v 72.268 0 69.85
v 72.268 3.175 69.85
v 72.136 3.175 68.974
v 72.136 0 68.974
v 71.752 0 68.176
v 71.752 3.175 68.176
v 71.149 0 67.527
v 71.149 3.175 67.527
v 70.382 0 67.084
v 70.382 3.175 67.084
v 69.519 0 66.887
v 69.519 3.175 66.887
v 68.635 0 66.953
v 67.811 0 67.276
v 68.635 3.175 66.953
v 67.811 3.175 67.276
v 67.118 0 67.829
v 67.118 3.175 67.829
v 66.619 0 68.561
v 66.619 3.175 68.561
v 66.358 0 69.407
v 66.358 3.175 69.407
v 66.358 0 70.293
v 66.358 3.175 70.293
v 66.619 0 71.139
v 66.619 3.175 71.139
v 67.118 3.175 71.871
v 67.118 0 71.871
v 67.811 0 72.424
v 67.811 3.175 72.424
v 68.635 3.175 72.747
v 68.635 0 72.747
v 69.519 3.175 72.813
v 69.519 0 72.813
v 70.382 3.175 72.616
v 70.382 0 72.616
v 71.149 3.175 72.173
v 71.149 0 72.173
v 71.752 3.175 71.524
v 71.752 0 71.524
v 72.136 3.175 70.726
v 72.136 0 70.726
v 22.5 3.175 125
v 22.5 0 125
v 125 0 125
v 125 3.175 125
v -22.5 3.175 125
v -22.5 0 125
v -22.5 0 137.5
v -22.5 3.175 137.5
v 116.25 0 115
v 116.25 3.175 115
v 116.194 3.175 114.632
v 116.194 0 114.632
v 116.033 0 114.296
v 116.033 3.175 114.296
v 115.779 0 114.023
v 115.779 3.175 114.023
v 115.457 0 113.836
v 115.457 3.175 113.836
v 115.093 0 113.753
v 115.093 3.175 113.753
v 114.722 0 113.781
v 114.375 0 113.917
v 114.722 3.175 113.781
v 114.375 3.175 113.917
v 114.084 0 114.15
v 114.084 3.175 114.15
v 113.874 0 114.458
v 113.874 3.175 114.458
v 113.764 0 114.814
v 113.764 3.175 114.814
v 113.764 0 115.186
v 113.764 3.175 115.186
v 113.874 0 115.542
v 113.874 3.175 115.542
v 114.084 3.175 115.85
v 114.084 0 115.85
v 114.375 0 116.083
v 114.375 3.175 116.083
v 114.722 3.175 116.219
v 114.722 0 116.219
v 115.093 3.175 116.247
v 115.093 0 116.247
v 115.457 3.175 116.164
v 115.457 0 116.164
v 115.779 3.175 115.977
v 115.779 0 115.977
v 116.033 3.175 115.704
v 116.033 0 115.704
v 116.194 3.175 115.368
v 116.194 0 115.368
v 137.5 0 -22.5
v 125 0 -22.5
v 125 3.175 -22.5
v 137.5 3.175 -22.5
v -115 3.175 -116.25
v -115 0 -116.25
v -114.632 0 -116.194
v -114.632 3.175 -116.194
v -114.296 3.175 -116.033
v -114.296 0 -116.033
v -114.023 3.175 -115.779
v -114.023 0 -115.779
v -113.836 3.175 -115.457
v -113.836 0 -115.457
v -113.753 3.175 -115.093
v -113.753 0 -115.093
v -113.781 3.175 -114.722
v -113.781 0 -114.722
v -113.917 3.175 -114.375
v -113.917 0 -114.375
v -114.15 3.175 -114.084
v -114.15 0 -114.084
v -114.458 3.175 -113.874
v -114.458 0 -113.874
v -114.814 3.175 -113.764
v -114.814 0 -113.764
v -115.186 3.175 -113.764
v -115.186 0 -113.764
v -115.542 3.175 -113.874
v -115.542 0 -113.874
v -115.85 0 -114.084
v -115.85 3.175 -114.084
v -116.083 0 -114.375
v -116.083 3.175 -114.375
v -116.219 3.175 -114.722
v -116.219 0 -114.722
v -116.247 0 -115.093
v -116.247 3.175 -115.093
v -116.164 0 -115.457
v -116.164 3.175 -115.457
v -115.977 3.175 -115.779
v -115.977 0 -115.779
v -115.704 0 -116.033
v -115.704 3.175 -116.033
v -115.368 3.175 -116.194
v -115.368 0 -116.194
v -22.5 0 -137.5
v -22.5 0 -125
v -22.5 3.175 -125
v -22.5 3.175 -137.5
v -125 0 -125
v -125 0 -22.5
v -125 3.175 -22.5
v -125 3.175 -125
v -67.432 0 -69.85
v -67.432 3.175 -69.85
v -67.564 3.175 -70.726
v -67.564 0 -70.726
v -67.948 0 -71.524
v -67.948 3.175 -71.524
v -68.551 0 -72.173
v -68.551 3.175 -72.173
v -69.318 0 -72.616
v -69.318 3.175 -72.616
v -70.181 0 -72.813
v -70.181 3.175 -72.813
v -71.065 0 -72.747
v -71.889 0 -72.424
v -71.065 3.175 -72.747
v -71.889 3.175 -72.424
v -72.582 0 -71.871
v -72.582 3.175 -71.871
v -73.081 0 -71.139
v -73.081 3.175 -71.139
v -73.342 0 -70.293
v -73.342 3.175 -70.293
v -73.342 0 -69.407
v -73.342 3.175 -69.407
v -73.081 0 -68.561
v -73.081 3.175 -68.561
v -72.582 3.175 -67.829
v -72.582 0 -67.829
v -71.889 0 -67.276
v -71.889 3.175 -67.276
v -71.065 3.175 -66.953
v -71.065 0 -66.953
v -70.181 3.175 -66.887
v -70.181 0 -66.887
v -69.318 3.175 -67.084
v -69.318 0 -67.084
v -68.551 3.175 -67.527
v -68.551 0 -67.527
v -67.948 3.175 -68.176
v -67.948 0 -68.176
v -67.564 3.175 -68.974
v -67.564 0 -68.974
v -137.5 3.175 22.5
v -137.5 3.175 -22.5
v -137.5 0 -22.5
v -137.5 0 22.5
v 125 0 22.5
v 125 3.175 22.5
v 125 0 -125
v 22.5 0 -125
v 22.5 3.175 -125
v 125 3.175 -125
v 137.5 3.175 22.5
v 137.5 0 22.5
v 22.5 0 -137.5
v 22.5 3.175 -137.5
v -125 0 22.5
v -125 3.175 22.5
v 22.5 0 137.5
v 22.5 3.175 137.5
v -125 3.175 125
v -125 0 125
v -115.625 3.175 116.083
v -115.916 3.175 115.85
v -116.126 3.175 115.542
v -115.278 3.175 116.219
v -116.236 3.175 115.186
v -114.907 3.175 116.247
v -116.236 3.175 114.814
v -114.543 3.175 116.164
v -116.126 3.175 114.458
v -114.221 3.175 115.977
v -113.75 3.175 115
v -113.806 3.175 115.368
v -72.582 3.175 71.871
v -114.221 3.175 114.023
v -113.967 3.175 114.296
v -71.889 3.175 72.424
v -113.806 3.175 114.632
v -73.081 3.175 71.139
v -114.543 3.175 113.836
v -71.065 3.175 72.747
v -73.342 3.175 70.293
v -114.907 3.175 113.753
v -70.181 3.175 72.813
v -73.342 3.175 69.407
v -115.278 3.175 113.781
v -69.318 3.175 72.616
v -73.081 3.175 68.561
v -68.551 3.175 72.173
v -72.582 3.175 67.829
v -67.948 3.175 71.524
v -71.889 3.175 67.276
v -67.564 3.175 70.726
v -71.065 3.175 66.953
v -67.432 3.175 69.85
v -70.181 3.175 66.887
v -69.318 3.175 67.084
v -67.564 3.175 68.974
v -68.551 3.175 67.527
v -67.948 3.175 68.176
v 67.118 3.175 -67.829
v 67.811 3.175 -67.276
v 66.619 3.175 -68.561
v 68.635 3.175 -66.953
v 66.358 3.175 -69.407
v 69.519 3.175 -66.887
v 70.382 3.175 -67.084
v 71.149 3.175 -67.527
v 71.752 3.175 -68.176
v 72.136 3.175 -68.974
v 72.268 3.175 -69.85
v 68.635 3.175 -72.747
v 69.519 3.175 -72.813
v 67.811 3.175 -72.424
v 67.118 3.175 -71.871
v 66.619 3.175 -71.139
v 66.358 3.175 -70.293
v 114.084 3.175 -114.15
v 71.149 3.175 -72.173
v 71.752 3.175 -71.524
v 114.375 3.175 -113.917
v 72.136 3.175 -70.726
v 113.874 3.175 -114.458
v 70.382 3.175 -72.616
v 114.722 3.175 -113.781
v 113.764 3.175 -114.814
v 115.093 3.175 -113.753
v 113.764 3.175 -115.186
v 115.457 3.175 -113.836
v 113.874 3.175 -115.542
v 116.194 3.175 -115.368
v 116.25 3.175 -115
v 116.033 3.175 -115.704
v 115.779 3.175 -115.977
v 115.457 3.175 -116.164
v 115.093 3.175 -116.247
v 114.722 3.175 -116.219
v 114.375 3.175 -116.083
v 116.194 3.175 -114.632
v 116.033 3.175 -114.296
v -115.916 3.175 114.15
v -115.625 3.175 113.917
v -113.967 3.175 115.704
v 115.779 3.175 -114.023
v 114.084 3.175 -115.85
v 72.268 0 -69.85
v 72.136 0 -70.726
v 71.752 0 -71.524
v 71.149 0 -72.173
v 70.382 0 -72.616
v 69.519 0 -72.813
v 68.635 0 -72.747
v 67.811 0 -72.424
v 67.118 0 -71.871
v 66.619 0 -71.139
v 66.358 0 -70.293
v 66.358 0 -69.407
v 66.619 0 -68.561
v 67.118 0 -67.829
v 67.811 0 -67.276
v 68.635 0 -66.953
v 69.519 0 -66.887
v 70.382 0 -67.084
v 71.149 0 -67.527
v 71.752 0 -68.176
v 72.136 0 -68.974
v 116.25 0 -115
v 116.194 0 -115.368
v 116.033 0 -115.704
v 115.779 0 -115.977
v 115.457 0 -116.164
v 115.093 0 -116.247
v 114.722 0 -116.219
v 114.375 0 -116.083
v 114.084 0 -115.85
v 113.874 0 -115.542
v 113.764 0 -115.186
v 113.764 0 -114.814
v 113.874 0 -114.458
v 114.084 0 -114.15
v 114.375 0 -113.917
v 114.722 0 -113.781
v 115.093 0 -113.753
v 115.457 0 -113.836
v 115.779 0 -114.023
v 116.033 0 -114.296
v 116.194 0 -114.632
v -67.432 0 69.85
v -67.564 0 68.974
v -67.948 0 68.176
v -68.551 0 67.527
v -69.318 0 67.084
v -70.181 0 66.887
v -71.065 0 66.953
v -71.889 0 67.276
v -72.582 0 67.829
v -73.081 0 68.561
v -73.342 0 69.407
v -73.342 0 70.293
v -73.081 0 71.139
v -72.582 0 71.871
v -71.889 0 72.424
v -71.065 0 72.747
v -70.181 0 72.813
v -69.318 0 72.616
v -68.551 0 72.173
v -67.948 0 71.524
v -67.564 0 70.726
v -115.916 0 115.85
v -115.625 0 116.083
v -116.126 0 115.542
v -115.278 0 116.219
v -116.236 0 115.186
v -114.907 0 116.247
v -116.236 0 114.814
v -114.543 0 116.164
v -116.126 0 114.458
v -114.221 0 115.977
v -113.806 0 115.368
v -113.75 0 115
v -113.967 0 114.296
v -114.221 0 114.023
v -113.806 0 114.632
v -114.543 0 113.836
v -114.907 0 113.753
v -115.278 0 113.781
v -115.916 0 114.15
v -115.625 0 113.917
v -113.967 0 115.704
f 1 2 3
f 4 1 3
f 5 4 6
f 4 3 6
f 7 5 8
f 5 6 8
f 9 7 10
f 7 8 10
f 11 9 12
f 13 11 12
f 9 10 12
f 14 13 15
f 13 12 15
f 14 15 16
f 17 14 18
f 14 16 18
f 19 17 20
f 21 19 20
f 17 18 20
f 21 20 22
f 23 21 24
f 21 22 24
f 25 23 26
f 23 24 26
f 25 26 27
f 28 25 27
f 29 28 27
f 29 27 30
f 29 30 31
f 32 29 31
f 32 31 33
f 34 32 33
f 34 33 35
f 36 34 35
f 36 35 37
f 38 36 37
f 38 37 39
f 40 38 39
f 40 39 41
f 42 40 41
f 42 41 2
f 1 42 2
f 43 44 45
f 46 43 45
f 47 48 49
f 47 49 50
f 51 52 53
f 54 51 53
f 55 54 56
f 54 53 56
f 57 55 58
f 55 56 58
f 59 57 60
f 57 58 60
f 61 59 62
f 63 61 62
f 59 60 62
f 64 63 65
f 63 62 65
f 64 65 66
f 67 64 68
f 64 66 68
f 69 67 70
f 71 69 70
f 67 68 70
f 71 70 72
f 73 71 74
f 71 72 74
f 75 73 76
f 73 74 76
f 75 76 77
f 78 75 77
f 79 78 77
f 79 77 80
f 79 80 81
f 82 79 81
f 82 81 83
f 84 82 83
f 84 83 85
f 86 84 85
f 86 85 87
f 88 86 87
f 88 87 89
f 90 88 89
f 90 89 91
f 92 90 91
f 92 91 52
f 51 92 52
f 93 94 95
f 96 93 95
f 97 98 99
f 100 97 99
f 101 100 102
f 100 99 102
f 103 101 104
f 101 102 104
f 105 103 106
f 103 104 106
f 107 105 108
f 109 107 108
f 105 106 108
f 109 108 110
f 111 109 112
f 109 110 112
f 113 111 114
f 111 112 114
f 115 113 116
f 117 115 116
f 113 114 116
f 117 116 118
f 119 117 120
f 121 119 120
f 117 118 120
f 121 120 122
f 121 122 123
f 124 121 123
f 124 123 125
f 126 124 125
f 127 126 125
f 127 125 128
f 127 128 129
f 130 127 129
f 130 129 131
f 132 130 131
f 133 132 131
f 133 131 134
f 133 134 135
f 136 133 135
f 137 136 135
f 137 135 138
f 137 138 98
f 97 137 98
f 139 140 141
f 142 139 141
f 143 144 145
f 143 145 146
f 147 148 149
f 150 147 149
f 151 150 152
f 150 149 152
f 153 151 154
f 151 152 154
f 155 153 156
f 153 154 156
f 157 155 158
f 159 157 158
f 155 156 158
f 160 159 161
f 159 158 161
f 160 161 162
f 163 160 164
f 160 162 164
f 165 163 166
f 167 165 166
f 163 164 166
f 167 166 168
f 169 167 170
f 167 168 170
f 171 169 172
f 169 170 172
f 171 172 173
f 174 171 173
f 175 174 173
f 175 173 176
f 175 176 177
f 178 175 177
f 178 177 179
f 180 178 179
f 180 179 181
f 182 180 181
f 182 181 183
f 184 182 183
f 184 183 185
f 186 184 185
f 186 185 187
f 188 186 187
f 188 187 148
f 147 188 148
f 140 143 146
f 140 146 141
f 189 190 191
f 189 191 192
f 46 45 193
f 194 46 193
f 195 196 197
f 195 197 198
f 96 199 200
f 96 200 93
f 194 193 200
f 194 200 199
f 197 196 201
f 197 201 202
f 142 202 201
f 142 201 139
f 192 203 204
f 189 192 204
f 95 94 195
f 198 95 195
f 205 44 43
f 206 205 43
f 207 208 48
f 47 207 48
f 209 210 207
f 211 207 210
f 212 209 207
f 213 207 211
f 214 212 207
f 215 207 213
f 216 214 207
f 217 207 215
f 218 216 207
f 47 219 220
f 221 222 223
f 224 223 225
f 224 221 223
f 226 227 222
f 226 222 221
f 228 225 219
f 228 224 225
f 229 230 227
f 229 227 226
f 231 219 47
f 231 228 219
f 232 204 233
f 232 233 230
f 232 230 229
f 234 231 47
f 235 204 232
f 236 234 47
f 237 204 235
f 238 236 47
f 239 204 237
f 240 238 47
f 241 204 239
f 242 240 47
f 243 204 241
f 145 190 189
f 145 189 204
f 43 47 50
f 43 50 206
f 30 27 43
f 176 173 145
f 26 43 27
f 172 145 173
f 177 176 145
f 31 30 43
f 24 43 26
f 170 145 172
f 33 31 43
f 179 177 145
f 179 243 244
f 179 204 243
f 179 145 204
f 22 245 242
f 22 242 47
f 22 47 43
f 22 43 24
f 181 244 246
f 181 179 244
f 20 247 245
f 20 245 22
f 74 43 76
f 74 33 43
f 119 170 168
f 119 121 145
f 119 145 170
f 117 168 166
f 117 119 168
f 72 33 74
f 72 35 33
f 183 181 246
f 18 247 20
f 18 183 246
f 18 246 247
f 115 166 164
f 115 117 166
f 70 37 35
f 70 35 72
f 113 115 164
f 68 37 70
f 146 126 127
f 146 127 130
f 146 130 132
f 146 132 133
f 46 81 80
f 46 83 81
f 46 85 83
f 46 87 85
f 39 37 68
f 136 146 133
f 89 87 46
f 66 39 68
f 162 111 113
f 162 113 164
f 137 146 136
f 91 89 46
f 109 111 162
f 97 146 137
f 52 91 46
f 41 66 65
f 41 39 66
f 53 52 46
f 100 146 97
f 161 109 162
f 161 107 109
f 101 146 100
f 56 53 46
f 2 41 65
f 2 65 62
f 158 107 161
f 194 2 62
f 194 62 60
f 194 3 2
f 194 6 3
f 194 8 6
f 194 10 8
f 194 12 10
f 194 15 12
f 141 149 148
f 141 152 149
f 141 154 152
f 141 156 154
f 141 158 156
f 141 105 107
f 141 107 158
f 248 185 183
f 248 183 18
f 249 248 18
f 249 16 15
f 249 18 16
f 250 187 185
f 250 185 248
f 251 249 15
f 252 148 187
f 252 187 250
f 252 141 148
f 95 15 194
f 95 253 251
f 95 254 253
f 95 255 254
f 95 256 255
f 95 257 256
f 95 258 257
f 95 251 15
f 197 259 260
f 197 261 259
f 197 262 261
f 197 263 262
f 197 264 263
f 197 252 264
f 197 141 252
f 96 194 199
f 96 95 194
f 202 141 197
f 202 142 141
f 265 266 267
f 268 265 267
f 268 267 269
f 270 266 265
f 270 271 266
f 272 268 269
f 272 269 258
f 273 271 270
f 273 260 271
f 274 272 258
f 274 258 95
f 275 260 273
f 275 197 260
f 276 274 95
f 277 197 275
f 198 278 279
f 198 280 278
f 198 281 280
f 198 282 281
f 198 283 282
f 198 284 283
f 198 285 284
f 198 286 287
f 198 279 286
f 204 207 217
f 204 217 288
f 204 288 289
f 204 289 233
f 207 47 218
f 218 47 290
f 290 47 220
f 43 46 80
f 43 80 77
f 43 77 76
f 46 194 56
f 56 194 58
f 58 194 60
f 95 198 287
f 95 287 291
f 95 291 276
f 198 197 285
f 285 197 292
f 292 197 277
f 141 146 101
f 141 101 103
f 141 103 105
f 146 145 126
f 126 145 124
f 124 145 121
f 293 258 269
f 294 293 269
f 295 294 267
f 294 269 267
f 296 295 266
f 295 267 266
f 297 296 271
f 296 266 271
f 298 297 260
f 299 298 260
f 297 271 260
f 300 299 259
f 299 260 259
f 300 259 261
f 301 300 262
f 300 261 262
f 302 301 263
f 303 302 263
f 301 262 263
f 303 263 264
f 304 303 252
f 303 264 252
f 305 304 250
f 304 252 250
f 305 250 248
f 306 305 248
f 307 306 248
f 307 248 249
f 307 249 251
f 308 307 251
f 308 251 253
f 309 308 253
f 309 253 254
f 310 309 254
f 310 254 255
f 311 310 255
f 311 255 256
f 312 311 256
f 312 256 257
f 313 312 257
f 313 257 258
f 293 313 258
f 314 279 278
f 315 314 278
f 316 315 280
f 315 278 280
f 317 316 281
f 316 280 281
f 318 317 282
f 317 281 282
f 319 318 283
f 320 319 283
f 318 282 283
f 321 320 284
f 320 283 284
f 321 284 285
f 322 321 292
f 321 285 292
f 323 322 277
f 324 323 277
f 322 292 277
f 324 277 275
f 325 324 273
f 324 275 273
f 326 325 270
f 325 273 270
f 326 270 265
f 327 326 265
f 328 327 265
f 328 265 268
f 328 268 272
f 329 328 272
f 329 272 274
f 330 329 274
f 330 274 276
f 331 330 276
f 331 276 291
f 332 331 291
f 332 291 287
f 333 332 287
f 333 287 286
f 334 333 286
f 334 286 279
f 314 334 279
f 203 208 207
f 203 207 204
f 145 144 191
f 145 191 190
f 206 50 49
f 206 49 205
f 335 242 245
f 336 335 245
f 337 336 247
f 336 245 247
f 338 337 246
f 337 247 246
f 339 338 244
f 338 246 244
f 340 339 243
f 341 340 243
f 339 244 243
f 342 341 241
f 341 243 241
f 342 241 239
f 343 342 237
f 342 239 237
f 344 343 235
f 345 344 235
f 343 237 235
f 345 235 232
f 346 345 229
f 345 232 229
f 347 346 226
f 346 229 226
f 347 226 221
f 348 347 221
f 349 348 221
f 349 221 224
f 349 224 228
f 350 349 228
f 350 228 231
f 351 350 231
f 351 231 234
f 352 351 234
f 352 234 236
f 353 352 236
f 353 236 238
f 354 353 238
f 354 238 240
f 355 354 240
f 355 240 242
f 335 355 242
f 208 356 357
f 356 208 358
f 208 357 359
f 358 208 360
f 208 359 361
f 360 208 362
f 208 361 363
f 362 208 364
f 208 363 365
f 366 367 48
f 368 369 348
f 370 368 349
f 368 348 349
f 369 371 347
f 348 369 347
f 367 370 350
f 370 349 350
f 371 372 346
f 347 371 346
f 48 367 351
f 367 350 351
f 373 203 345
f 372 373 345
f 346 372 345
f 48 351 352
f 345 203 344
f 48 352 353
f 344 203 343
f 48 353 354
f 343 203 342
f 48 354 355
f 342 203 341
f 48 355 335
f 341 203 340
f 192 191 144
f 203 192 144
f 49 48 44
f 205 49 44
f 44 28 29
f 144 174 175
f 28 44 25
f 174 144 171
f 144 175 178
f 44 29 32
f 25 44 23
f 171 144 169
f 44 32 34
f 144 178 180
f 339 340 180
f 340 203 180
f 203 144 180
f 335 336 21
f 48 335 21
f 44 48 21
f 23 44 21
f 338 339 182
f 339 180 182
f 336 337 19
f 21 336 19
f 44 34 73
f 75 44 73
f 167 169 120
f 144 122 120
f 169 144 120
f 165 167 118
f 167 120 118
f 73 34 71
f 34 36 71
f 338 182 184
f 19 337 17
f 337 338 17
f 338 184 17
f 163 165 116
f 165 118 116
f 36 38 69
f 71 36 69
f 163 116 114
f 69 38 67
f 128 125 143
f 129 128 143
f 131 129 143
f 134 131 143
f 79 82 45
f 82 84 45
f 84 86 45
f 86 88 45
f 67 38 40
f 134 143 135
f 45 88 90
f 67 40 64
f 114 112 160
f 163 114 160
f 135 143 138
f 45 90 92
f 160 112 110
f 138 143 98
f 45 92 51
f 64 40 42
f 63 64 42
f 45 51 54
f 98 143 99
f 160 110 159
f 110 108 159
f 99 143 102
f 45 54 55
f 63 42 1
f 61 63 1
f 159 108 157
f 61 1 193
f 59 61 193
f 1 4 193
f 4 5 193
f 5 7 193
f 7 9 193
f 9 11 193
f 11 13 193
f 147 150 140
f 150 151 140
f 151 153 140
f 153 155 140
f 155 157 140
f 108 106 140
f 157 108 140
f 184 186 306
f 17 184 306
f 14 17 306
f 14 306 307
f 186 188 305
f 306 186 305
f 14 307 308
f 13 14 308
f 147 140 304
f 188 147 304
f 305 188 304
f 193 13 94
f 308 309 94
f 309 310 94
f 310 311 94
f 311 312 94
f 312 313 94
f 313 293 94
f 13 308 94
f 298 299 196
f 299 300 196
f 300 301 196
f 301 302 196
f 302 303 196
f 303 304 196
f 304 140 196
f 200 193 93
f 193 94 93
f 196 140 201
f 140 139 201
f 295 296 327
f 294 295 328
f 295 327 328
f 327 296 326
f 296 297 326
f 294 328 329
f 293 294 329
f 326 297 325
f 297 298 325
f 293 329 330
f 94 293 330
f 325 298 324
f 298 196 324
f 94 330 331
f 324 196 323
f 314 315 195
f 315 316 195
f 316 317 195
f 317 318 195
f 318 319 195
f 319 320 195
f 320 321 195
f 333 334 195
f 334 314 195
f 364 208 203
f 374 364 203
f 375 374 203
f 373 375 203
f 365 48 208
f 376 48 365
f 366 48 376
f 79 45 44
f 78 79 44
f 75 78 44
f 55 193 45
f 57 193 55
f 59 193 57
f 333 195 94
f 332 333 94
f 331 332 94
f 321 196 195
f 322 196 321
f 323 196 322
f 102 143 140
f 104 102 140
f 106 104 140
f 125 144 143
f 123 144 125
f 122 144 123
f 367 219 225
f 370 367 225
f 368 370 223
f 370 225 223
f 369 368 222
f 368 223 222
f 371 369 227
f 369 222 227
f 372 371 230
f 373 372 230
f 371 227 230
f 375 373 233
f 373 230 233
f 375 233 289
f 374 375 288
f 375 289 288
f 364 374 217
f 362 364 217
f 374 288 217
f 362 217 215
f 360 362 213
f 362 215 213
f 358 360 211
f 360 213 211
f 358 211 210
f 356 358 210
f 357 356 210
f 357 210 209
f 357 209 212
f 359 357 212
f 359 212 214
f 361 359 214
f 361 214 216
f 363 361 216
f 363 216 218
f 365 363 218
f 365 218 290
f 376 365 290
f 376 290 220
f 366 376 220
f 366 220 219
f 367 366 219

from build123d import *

# Parameters (mm, degrees)
SKETCH2_W           = 250
SKETCH2_H           = 250
BOSS_EXTRUDE1_DEPTH = 3.175
SKETCH10_W          = 45
SKETCH10_H          = 3.175
BOSS_EXTRUDE2_DEPTH = 12.5
SKETCH11_W          = 45
SKETCH11_H          = 3.175
BOSS_EXTRUDE3_DEPTH = 12.5
SKETCH13_W          = 45
SKETCH13_H          = 3.175
BOSS_EXTRUDE4_DEPTH = 12.5
SKETCH14_W          = 45
SKETCH14_H          = 3.175
BOSS_EXTRUDE5_DEPTH = 12.5
M3_TAPPED_HOLE1_D   = 2.5
SKETCH21_R          = 1.25
CUT_EXTRUDE2_DEPTH  = 10
SKETCH23_R          = 2.9718
CUT_EXTRUDE10_DEPTH = 10


with BuildPart() as part:
    # Sketch2 → Boss-Extrude1 (new body)
    with BuildSketch(Plane(origin=(0, 0, 0), x_dir=(1, 0, 0), z_dir=(0, 1, 0))):
        Rectangle(SKETCH2_W, SKETCH2_H)
    extrude(amount=BOSS_EXTRUDE1_DEPTH)

    # Sketch10 → Boss-Extrude2 (add)
    with BuildSketch(Plane(origin=(0, 0, -125), x_dir=(-1, 0, 0), z_dir=(0, 0, -1))):
        with Locations((0, 1.5875)):
            Rectangle(SKETCH10_W, SKETCH10_H)
    extrude(amount=BOSS_EXTRUDE2_DEPTH)

    # Sketch11 → Boss-Extrude3 (add)
    with BuildSketch(Plane.ZY.offset(125)):
        with Locations((0, 1.5875)):
            Rectangle(SKETCH11_W, SKETCH11_H)
    extrude(amount=BOSS_EXTRUDE3_DEPTH)

    # Sketch13 → Boss-Extrude4 (add)
    with BuildSketch(Plane.XY.offset(125)):
        with Locations((0, 1.5875)):
            Rectangle(SKETCH13_W, SKETCH13_H)
    extrude(amount=BOSS_EXTRUDE4_DEPTH)

    # Sketch14 → Boss-Extrude5 (add)
    with BuildSketch(Plane(origin=(125, 0, 0), x_dir=(0, 0, -1), z_dir=(1, 0, 0))):
        with Locations((0, 1.5875)):
            Rectangle(SKETCH14_W, SKETCH14_H)
    extrude(amount=BOSS_EXTRUDE5_DEPTH)

    # M3 Tapped Hole1 (through all)
    with Locations(Plane(origin=(-115, 3.175, -115), x_dir=(0, 0, 1), z_dir=(0, 1, 0))):
        with Locations((0, 0)):
            Hole(M3_TAPPED_HOLE1_D / 2)

    # Sketch21 → Cut-Extrude2 (cut)
    with BuildSketch(Plane(origin=(0, 3.175, 0), x_dir=(1, 0, 0), z_dir=(0, 1, 0))):
        with Locations((115, 115)):
            Circle(SKETCH21_R)
        with Locations((115, -115)):
            Circle(SKETCH21_R)
        with Locations((-115, -115)):
            Circle(SKETCH21_R)
    extrude(amount=-CUT_EXTRUDE2_DEPTH, mode=Mode.SUBTRACT)

    # Sketch23 → Cut-Extrude10 (cut)
    with BuildSketch(Plane(origin=(0, 3.175, 0), x_dir=(1, 0, 0), z_dir=(0, 1, 0))):
        with Locations((-70.403440877, -69.85)):
            Circle(SKETCH23_R)
        with Locations((-70.403440877, 69.85)):
            Circle(SKETCH23_R)
        with Locations((69.296559123, 69.85)):
            Circle(SKETCH23_R)
        with Locations((69.296559123, -69.85)):
            Circle(SKETCH23_R)
    extrude(amount=-CUT_EXTRUDE10_DEPTH, mode=Mode.SUBTRACT)


solid = part.part
